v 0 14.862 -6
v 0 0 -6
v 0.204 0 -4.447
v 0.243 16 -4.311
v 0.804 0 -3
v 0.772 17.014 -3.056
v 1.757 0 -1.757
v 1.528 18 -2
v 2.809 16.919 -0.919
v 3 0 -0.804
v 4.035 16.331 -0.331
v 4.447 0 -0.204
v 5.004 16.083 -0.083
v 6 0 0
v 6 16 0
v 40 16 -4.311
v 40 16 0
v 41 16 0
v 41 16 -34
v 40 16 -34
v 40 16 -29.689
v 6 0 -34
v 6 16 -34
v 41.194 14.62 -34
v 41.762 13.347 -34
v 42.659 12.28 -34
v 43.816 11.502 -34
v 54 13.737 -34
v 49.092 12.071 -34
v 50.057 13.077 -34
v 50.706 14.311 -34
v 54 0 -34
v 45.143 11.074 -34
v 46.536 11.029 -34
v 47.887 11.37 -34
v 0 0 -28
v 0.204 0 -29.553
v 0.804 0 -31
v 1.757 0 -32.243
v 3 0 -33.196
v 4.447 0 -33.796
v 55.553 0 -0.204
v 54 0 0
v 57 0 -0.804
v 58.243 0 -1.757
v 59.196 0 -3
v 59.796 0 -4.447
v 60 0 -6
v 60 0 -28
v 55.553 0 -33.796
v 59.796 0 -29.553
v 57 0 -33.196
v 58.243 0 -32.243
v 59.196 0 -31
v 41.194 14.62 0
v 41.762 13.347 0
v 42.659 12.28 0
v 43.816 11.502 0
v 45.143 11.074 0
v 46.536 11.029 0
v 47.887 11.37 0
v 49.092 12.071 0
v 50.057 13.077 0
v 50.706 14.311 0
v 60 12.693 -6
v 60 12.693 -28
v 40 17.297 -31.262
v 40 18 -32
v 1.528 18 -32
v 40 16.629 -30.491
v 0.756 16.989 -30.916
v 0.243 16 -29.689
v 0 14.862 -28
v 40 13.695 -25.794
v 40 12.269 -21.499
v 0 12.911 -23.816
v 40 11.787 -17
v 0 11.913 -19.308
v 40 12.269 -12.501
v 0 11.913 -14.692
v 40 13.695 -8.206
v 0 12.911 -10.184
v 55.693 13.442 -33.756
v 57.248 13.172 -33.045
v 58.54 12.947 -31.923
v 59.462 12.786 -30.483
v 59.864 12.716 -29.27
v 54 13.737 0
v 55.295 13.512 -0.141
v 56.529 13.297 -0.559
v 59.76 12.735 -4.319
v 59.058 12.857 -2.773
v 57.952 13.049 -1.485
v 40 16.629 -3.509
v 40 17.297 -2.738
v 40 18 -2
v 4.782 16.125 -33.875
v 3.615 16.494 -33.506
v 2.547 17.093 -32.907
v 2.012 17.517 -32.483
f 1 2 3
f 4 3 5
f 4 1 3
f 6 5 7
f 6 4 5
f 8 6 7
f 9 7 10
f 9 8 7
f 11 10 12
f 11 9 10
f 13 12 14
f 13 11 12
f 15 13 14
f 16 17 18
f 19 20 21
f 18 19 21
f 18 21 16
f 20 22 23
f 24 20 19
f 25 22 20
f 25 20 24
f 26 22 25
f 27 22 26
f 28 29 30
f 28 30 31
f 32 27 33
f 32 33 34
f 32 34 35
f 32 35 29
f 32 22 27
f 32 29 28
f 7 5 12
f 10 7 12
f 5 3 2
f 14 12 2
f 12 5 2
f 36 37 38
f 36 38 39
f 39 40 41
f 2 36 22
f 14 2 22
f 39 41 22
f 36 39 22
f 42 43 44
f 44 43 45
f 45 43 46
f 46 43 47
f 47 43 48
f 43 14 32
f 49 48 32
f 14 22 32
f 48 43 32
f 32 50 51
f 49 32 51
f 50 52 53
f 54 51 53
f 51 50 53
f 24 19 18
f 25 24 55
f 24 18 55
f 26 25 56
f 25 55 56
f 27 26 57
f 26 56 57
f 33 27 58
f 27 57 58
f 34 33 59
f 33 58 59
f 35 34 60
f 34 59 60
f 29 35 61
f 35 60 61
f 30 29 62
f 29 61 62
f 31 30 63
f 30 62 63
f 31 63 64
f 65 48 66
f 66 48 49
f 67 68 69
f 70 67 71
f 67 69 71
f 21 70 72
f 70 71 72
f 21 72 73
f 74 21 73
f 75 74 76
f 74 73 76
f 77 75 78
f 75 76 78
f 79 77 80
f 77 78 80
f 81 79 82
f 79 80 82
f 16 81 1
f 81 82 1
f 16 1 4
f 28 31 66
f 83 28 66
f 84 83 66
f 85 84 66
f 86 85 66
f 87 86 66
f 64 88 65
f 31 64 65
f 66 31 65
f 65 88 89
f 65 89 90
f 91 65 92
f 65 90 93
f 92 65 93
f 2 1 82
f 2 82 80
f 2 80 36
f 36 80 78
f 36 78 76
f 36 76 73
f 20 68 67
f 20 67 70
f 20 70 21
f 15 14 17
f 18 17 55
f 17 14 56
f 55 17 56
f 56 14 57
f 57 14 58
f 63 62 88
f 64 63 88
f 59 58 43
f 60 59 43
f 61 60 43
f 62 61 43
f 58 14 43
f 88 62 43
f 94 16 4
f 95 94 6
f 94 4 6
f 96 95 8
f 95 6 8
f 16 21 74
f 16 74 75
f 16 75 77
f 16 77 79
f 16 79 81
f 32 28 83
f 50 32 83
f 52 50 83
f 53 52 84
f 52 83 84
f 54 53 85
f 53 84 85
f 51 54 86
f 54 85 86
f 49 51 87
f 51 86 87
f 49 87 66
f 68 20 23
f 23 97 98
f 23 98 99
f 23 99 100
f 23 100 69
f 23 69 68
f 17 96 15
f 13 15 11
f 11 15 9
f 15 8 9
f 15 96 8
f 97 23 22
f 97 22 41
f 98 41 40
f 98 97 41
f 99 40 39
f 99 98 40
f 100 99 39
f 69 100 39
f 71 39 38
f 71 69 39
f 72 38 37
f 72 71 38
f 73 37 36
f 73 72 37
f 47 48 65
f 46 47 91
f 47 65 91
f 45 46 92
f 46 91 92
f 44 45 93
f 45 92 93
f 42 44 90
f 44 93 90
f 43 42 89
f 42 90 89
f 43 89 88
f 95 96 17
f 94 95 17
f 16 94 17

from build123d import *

# Parameters (mm, degrees)
SKETCH1_W           = 60
SKETCH1_H           = 34
BOSS_EXTRUDE1_DEPTH = 16
BOSS_EXTRUDE2_DEPTH = 40
CUT_EXTRUDE2_DEPTH  = 40
SKETCH2_R           = 5
CUT_EXTRUDE1_DEPTH  = 72.274118725
FILLET1_R           = 6
CUT_EXTRUDE3_DEPTH  = 72.274118798


with BuildPart() as part:
    # Sketch1 → Boss-Extrude1 (new body)
    with BuildSketch(Plane(origin=(0, 0, 0), x_dir=(1, 0, 0), z_dir=(0, 1, 0))):
        with Locations((30, 17)):
            Rectangle(SKETCH1_W, SKETCH1_H)
    extrude(amount=BOSS_EXTRUDE1_DEPTH)

    # Sketch3 → Boss-Extrude2 (add)
    with BuildSketch(Plane.ZY):
        with BuildLine():
            Line((-34, 16), (-32, 18))
            ThreePointArc((-32, 18), (-30.88035776, 16.958314663), (-29.68857754, 16))
            Line((-29.68857754, 16), (-34, 16))
        make_face()
        with BuildLine():
            Line((-2, 18), (0, 16))
            Line((0, 16), (-4.31142246, 16))
            ThreePointArc((-4.31142246, 16), (-3.11964224, 16.958314663), (-2, 18))
        make_face()
    extrude(amount=-BOSS_EXTRUDE2_DEPTH)

    # Sketch4 → Cut-Extrude2 (cut)
    with BuildSketch(Plane.ZY):
        with BuildLine():
            Line((-19.472144861, 33), (-38.213203436, 33))
            ThreePointArc((-38.213203436, 33), (-17, 11.786796564), (4.213203436, 33))
            Line((4.213203436, 33), (-19.472144861, 33))
        make_face()
    extrude(amount=-CUT_EXTRUDE2_DEPTH, mode=Mode.SUBTRACT)

    # Sketch2 → Cut-Extrude1 (cut, through all)
    with BuildSketch(Plane.XY):
        with Locations((46, 16)):
            Circle(SKETCH2_R)
    extrude(amount=-CUT_EXTRUDE1_DEPTH, mode=Mode.SUBTRACT)

    # Fillet1
    fillet1_edges = [part.edges().sort_by_distance(p)[0] for p in [
        (0, 8, -34),
        (60, 8, -34),
        (60, 8, 0),
        (0, 8, 0),
    ]]
    fillet(fillet1_edges, radius=FILLET1_R)

    # Sketch5 → Cut-Extrude3 (cut, through all)
    with BuildSketch(Plane.XY):
        Polygon((50.705913613, 14.310509822), (60, 12.692705636), (60, 16), (51, 16), align=None)
    extrude(amount=-CUT_EXTRUDE3_DEPTH, mode=Mode.SUBTRACT)


solid = part.part
